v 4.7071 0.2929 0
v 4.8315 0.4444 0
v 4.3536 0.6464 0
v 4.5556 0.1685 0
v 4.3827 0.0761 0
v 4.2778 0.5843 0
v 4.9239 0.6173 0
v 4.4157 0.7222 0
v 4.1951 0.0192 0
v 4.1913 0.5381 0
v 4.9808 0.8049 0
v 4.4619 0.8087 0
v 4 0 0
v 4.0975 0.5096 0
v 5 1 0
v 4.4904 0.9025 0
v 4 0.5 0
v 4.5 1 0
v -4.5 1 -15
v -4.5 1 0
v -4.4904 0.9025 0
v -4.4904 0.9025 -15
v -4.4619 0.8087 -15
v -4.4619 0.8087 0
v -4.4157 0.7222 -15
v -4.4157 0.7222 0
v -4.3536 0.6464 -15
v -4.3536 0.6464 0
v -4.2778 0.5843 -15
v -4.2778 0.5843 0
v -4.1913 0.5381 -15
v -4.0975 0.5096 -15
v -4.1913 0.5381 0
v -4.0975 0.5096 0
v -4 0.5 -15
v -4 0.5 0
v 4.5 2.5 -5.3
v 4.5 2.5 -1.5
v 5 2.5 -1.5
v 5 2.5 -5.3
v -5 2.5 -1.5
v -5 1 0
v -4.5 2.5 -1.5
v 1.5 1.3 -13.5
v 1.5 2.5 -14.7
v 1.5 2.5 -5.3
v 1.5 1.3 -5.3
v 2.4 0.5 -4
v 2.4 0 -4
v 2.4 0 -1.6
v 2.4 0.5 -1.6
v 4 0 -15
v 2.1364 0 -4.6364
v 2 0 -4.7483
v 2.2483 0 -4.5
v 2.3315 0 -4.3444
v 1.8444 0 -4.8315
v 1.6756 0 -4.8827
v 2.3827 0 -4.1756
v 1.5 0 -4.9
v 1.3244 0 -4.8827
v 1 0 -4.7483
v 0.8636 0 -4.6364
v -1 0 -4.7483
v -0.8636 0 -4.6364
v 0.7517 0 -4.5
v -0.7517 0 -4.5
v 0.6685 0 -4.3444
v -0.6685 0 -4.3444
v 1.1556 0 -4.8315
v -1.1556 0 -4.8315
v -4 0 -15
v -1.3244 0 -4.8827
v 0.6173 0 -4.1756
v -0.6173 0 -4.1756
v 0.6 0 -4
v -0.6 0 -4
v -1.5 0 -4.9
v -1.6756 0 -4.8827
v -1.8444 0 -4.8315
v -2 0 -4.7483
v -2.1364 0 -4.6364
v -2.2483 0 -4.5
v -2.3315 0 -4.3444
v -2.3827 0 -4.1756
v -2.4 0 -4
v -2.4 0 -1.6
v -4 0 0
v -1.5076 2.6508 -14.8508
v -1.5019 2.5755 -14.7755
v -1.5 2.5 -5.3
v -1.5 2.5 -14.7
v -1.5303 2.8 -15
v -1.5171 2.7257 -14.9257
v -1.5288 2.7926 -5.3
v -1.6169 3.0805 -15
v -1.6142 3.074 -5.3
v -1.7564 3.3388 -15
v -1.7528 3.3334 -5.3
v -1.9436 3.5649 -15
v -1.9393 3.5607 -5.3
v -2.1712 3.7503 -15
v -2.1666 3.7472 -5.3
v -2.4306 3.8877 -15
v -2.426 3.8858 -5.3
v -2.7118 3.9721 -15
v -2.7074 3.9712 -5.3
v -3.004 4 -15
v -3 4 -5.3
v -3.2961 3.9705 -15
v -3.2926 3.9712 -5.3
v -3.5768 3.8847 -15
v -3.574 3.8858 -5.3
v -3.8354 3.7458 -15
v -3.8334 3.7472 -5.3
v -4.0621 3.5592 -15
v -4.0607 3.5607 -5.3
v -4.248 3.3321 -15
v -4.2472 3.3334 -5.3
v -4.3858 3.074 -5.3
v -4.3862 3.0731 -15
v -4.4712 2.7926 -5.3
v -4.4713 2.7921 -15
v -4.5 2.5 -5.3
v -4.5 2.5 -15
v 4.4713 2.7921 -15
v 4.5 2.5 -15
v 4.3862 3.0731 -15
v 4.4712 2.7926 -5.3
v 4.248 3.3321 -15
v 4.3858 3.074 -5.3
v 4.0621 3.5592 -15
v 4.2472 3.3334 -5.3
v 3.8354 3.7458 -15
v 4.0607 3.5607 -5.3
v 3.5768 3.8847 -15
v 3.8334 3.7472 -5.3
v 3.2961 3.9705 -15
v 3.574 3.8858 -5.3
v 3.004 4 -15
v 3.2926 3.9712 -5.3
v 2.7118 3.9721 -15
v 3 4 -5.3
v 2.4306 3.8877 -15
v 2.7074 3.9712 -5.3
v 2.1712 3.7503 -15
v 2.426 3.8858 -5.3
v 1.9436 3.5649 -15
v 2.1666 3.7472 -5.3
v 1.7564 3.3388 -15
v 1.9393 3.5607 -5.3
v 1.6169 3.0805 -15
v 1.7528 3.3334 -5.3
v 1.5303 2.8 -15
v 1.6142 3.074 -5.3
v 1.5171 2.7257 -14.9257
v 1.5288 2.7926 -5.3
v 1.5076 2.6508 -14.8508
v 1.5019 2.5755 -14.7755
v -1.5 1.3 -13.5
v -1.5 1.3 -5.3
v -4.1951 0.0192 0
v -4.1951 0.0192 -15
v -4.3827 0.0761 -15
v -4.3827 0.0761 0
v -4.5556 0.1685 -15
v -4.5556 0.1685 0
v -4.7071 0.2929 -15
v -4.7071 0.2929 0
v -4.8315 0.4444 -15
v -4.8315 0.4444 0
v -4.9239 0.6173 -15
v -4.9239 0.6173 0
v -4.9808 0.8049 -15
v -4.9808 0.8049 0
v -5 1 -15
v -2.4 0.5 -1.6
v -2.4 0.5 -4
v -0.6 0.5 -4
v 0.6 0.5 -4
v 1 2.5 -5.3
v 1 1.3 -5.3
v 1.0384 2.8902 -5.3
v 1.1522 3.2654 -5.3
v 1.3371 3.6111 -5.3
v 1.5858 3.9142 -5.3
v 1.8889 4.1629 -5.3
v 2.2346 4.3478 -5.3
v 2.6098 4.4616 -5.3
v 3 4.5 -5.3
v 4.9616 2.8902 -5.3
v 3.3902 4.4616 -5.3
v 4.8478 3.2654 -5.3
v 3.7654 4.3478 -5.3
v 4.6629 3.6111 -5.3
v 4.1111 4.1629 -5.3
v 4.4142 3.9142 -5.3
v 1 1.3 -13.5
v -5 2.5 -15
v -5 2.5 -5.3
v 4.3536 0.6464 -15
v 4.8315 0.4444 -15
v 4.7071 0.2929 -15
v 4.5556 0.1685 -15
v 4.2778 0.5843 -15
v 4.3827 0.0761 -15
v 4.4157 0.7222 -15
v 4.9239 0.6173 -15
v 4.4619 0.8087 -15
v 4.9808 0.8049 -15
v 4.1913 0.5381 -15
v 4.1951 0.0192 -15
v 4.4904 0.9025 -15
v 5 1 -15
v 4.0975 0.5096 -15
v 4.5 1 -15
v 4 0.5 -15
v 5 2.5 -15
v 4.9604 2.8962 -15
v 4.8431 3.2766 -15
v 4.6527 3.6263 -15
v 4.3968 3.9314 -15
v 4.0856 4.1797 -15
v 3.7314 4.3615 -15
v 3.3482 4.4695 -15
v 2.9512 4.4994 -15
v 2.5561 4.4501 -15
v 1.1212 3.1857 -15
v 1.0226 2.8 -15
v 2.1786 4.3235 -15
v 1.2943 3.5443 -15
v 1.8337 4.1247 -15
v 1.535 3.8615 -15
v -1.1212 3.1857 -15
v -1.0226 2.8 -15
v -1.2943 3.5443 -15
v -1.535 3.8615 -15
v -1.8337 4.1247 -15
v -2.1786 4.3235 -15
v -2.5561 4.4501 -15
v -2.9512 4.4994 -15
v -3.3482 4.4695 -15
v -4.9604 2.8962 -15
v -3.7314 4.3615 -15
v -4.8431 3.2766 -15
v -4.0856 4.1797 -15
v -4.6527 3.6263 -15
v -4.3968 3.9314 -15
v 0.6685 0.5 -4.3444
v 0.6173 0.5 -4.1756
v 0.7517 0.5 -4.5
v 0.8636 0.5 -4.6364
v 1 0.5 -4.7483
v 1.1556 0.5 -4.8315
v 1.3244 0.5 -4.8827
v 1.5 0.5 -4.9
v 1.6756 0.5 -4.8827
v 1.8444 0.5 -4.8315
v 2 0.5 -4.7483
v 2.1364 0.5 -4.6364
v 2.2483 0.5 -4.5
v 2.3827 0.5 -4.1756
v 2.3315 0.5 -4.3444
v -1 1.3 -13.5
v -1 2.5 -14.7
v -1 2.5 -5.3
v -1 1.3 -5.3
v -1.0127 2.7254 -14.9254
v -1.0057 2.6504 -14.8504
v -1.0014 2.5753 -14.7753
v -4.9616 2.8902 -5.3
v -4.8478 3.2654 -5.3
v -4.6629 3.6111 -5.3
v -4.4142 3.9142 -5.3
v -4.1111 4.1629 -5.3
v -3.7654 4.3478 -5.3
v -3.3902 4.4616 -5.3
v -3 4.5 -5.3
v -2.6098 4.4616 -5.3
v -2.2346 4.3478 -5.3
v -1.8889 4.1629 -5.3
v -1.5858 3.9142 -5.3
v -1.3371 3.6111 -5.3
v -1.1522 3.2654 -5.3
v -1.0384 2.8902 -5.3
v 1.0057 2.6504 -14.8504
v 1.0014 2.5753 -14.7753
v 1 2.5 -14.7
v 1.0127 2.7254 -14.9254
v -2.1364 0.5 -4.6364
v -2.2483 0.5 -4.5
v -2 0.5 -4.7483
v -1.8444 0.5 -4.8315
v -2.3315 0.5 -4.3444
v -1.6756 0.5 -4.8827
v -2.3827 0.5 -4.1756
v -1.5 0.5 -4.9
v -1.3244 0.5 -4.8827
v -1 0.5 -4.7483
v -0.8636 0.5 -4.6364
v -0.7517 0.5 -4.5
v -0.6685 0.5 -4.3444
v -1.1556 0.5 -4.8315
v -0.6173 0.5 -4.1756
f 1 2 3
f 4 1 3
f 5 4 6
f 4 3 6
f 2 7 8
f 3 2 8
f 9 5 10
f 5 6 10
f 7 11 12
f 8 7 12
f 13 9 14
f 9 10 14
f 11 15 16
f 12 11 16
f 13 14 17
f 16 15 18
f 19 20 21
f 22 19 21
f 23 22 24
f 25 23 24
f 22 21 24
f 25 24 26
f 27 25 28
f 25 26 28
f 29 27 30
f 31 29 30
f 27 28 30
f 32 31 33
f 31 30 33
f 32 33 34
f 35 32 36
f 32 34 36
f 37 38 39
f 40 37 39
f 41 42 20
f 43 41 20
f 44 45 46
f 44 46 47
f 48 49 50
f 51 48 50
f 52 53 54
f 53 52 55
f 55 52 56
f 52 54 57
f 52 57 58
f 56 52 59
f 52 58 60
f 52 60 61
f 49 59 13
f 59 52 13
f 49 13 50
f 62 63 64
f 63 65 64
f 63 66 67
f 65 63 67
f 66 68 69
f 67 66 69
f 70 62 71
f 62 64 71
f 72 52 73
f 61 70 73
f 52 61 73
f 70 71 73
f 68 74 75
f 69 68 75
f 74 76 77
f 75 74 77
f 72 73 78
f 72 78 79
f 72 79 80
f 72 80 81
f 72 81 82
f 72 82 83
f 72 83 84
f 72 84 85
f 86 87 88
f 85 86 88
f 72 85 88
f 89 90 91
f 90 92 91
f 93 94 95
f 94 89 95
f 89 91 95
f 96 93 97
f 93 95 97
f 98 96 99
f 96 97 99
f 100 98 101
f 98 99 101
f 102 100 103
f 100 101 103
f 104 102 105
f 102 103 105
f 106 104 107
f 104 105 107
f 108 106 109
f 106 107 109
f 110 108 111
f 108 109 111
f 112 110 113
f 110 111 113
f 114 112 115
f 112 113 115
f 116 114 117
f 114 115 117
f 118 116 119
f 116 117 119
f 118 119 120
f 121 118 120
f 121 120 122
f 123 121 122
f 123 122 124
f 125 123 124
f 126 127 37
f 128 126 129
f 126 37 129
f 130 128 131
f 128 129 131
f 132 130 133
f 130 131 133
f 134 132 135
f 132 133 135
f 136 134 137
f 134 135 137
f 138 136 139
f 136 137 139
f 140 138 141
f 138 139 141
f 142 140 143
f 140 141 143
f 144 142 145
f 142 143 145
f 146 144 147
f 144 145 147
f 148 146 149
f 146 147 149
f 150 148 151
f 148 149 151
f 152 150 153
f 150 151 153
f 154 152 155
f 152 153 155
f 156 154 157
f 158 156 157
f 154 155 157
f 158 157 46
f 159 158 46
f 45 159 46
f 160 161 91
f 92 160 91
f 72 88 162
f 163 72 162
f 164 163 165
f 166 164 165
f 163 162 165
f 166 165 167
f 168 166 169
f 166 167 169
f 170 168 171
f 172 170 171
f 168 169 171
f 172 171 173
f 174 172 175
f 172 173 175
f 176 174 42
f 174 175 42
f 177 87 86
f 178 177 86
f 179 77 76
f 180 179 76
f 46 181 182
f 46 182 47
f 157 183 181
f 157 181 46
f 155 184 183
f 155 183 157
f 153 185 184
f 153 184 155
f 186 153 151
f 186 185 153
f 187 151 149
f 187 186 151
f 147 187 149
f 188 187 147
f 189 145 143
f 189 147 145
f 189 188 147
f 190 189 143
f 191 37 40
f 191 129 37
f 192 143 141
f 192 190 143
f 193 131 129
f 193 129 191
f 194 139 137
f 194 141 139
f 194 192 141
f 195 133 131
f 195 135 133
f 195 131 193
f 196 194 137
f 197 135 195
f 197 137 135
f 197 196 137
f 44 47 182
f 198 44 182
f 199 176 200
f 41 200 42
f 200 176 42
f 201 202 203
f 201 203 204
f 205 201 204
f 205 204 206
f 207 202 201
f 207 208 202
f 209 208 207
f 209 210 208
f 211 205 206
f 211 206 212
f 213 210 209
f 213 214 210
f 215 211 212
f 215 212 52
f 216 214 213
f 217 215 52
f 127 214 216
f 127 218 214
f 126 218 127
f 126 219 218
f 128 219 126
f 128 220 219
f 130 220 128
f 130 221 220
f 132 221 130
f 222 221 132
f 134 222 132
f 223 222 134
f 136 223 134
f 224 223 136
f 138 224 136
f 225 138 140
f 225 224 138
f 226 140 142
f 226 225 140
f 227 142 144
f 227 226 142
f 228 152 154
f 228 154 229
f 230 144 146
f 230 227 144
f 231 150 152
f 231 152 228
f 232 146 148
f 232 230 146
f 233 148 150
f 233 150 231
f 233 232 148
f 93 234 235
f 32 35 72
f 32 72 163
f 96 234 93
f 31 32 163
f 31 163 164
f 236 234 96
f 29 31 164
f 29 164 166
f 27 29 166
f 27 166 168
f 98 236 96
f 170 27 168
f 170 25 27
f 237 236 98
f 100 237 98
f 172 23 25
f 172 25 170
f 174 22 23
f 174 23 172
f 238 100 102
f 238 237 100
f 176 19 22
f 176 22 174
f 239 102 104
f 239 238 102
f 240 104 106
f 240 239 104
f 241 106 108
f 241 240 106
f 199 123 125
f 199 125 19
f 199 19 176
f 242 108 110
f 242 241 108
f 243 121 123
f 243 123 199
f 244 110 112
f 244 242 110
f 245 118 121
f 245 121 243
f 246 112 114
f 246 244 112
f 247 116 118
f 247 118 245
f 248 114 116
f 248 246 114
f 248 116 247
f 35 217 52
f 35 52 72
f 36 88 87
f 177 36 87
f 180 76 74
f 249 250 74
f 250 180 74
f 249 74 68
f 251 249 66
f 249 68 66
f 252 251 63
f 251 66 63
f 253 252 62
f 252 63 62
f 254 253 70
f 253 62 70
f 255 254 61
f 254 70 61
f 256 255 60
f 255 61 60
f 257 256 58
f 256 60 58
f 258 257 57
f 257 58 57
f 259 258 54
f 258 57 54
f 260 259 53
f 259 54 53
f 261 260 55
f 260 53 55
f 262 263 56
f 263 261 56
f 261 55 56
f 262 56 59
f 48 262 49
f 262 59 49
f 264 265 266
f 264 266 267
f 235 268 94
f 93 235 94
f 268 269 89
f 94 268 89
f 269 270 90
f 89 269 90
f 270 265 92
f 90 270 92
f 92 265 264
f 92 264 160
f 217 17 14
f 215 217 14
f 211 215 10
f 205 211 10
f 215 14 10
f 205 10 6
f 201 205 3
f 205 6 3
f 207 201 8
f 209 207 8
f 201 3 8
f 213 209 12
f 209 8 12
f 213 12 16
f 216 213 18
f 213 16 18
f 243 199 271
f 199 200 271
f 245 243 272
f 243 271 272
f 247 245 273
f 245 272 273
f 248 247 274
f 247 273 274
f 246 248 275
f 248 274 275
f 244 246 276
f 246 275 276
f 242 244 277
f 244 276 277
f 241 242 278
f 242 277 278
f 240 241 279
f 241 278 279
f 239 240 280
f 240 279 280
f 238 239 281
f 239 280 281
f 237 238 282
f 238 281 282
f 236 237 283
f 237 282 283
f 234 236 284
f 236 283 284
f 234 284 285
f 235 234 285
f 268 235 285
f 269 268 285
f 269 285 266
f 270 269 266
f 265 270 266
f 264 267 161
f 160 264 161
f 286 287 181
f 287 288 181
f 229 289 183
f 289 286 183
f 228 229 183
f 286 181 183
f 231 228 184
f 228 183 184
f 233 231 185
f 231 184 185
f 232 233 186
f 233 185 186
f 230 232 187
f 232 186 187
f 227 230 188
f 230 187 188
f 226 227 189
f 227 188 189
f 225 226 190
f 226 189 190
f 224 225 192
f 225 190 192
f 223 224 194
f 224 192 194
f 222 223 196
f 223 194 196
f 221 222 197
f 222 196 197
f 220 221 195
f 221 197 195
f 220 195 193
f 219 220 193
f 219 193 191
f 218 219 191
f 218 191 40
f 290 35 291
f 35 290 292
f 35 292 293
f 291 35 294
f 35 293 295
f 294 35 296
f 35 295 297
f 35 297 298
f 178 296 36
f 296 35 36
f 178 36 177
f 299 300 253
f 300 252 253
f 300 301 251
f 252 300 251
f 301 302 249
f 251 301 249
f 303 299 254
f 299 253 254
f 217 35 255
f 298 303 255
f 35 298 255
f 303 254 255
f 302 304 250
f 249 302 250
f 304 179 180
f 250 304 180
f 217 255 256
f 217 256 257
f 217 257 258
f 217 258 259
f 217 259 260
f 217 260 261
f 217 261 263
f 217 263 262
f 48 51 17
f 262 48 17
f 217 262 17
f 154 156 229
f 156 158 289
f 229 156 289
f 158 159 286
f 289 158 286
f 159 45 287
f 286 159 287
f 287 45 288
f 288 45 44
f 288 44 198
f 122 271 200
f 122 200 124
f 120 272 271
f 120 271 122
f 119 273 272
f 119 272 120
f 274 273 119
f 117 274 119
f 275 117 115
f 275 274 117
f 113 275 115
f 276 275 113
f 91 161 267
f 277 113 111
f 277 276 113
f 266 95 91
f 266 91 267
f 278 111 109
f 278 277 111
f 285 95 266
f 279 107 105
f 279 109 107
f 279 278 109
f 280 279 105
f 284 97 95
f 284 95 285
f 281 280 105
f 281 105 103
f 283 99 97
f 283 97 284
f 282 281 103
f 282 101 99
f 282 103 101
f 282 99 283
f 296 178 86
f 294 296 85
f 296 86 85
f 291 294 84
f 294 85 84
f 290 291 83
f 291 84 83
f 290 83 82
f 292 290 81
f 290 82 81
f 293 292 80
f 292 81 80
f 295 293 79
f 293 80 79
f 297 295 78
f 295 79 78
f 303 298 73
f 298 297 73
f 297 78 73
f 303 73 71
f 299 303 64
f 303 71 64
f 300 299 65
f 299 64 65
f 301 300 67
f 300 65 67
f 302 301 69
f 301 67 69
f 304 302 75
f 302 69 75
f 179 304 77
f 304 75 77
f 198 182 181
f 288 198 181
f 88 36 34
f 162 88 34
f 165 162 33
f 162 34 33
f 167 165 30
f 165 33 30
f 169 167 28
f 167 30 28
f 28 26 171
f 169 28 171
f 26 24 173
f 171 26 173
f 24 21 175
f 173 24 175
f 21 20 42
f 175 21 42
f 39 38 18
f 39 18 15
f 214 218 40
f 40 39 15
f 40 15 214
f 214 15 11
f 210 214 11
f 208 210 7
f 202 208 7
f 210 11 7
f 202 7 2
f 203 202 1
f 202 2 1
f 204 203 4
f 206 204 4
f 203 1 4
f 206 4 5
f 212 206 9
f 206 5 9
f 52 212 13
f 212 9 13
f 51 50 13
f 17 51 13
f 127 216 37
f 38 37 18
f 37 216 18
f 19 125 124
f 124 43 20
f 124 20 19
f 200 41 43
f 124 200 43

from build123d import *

# Parameters (mm, degrees)
BOSS_EXTRUDE1_DEPTH = 15
CUT_EXTRUDE1_DEPTH  = 17.439282223
CUT_EXTRUDE2_START  = -4.5
SKETCH3_W           = 10
SKETCH3_H           = 5.3
CUT_EXTRUDE2_DEPTH  = 2
SKETCH4_W           = 3
SKETCH4_H           = 0.815561475
CUT_EXTRUDE3_DEPTH  = 2
CHAMFER1_SIZE       = 1.5


with BuildPart() as part:
    # Sketch1 → Boss-Extrude1 (new body)
    with BuildSketch(Plane.XY):
        with BuildLine():
            Line((0, 0), (-4, 0))
            ThreePointArc((-4, 0), (-4.707106781, 0.292893219), (-5, 1))
            Line((-5, 1), (-5, 2.5))
            ThreePointArc((-5, 2.5), (-3, 4.5), (-1, 2.5))
            Line((-1, 2.5), (-1, 1.3))
            Line((-1, 1.3), (-1.5, 1.3))
            Line((-1.5, 1.3), (-1.5, 2.5))
            ThreePointArc((-1.5, 2.5), (-3, 4), (-4.5, 2.5))
            Line((-4.5, 2.5), (-4.5, 1))
            ThreePointArc((-4.5, 1), (-4.353553391, 0.646446609), (-4, 0.5))
            Line((-4, 0.5), (0, 0.5))
            Line((0, 0.5), (4, 0.5))
            ThreePointArc((4, 0.5), (4.353553391, 0.646446609), (4.5, 1))
            Line((4.5, 1), (4.5, 2.5))
            ThreePointArc((4.5, 2.5), (3, 4), (1.5, 2.5))
            Line((1.5, 2.5), (1.5, 1.3))
            Line((1.5, 1.3), (1, 1.3))
            Line((1, 1.3), (1, 2.5))
            ThreePointArc((1, 2.5), (3, 4.5), (5, 2.5))
            Line((5, 2.5), (5, 1))
            ThreePointArc((5, 1), (4.707106781, 0.292893219), (4, 0))
            Line((4, 0), (0, 0))
        make_face()
    extrude(amount=-BOSS_EXTRUDE1_DEPTH)

    # Sketch2 → Cut-Extrude1 (cut, through all)
    with BuildSketch(Plane.XZ):
        with BuildLine():
            Line((-4, 0), (-2.4, -1.6))
            Line((-2.4, -1.6), (-2.4, -4))
            ThreePointArc((-2.4, -4), (-1.5, -4.9), (-0.6, -4))
            Line((-0.6, -4), (0.6, -4))
            ThreePointArc((0.6, -4), (1.5, -4.9), (2.4, -4))
            Line((2.4, -4), (2.4, -1.6))
            Line((2.4, -1.6), (4, 0))
            Line((4, 0), (4, 0.537500588))
            Line((4, 0.537500588), (-4, 0.537500588))
            Line((-4, 0.537500588), (-4, 0))
        make_face()
    extrude(amount=-CUT_EXTRUDE1_DEPTH, mode=Mode.SUBTRACT)

    # Sketch3 → Cut-Extrude2 (cut)
    with BuildSketch(Plane.XZ.offset(CUT_EXTRUDE2_START)):
        with Locations((0, -2.65)):
            Rectangle(SKETCH3_W, SKETCH3_H)
    extrude(amount=CUT_EXTRUDE2_DEPTH, mode=Mode.SUBTRACT)

    # Sketch4 → Cut-Extrude3 (cut)
    with BuildSketch(Plane(origin=(0, 2.5, 0), x_dir=(1, 0, 0), z_dir=(0, 1, 0))):
        with Locations((0, 4.892219263)):
            Rectangle(SKETCH4_W, SKETCH4_H)
    extrude(amount=-CUT_EXTRUDE3_DEPTH, mode=Mode.SUBTRACT)

    # Chamfer1
    chamfer1_edges = [part.edges().sort_by_distance(p)[0] for p in [
        (4.75, 2.5, 0),
        (-4.75, 2.5, 0),
        (1.25, 1.3, -15),
        (-1.25, 1.3, -15),
    ]]
    chamfer(chamfer1_edges, length=CHAMFER1_SIZE)


solid = part.part
